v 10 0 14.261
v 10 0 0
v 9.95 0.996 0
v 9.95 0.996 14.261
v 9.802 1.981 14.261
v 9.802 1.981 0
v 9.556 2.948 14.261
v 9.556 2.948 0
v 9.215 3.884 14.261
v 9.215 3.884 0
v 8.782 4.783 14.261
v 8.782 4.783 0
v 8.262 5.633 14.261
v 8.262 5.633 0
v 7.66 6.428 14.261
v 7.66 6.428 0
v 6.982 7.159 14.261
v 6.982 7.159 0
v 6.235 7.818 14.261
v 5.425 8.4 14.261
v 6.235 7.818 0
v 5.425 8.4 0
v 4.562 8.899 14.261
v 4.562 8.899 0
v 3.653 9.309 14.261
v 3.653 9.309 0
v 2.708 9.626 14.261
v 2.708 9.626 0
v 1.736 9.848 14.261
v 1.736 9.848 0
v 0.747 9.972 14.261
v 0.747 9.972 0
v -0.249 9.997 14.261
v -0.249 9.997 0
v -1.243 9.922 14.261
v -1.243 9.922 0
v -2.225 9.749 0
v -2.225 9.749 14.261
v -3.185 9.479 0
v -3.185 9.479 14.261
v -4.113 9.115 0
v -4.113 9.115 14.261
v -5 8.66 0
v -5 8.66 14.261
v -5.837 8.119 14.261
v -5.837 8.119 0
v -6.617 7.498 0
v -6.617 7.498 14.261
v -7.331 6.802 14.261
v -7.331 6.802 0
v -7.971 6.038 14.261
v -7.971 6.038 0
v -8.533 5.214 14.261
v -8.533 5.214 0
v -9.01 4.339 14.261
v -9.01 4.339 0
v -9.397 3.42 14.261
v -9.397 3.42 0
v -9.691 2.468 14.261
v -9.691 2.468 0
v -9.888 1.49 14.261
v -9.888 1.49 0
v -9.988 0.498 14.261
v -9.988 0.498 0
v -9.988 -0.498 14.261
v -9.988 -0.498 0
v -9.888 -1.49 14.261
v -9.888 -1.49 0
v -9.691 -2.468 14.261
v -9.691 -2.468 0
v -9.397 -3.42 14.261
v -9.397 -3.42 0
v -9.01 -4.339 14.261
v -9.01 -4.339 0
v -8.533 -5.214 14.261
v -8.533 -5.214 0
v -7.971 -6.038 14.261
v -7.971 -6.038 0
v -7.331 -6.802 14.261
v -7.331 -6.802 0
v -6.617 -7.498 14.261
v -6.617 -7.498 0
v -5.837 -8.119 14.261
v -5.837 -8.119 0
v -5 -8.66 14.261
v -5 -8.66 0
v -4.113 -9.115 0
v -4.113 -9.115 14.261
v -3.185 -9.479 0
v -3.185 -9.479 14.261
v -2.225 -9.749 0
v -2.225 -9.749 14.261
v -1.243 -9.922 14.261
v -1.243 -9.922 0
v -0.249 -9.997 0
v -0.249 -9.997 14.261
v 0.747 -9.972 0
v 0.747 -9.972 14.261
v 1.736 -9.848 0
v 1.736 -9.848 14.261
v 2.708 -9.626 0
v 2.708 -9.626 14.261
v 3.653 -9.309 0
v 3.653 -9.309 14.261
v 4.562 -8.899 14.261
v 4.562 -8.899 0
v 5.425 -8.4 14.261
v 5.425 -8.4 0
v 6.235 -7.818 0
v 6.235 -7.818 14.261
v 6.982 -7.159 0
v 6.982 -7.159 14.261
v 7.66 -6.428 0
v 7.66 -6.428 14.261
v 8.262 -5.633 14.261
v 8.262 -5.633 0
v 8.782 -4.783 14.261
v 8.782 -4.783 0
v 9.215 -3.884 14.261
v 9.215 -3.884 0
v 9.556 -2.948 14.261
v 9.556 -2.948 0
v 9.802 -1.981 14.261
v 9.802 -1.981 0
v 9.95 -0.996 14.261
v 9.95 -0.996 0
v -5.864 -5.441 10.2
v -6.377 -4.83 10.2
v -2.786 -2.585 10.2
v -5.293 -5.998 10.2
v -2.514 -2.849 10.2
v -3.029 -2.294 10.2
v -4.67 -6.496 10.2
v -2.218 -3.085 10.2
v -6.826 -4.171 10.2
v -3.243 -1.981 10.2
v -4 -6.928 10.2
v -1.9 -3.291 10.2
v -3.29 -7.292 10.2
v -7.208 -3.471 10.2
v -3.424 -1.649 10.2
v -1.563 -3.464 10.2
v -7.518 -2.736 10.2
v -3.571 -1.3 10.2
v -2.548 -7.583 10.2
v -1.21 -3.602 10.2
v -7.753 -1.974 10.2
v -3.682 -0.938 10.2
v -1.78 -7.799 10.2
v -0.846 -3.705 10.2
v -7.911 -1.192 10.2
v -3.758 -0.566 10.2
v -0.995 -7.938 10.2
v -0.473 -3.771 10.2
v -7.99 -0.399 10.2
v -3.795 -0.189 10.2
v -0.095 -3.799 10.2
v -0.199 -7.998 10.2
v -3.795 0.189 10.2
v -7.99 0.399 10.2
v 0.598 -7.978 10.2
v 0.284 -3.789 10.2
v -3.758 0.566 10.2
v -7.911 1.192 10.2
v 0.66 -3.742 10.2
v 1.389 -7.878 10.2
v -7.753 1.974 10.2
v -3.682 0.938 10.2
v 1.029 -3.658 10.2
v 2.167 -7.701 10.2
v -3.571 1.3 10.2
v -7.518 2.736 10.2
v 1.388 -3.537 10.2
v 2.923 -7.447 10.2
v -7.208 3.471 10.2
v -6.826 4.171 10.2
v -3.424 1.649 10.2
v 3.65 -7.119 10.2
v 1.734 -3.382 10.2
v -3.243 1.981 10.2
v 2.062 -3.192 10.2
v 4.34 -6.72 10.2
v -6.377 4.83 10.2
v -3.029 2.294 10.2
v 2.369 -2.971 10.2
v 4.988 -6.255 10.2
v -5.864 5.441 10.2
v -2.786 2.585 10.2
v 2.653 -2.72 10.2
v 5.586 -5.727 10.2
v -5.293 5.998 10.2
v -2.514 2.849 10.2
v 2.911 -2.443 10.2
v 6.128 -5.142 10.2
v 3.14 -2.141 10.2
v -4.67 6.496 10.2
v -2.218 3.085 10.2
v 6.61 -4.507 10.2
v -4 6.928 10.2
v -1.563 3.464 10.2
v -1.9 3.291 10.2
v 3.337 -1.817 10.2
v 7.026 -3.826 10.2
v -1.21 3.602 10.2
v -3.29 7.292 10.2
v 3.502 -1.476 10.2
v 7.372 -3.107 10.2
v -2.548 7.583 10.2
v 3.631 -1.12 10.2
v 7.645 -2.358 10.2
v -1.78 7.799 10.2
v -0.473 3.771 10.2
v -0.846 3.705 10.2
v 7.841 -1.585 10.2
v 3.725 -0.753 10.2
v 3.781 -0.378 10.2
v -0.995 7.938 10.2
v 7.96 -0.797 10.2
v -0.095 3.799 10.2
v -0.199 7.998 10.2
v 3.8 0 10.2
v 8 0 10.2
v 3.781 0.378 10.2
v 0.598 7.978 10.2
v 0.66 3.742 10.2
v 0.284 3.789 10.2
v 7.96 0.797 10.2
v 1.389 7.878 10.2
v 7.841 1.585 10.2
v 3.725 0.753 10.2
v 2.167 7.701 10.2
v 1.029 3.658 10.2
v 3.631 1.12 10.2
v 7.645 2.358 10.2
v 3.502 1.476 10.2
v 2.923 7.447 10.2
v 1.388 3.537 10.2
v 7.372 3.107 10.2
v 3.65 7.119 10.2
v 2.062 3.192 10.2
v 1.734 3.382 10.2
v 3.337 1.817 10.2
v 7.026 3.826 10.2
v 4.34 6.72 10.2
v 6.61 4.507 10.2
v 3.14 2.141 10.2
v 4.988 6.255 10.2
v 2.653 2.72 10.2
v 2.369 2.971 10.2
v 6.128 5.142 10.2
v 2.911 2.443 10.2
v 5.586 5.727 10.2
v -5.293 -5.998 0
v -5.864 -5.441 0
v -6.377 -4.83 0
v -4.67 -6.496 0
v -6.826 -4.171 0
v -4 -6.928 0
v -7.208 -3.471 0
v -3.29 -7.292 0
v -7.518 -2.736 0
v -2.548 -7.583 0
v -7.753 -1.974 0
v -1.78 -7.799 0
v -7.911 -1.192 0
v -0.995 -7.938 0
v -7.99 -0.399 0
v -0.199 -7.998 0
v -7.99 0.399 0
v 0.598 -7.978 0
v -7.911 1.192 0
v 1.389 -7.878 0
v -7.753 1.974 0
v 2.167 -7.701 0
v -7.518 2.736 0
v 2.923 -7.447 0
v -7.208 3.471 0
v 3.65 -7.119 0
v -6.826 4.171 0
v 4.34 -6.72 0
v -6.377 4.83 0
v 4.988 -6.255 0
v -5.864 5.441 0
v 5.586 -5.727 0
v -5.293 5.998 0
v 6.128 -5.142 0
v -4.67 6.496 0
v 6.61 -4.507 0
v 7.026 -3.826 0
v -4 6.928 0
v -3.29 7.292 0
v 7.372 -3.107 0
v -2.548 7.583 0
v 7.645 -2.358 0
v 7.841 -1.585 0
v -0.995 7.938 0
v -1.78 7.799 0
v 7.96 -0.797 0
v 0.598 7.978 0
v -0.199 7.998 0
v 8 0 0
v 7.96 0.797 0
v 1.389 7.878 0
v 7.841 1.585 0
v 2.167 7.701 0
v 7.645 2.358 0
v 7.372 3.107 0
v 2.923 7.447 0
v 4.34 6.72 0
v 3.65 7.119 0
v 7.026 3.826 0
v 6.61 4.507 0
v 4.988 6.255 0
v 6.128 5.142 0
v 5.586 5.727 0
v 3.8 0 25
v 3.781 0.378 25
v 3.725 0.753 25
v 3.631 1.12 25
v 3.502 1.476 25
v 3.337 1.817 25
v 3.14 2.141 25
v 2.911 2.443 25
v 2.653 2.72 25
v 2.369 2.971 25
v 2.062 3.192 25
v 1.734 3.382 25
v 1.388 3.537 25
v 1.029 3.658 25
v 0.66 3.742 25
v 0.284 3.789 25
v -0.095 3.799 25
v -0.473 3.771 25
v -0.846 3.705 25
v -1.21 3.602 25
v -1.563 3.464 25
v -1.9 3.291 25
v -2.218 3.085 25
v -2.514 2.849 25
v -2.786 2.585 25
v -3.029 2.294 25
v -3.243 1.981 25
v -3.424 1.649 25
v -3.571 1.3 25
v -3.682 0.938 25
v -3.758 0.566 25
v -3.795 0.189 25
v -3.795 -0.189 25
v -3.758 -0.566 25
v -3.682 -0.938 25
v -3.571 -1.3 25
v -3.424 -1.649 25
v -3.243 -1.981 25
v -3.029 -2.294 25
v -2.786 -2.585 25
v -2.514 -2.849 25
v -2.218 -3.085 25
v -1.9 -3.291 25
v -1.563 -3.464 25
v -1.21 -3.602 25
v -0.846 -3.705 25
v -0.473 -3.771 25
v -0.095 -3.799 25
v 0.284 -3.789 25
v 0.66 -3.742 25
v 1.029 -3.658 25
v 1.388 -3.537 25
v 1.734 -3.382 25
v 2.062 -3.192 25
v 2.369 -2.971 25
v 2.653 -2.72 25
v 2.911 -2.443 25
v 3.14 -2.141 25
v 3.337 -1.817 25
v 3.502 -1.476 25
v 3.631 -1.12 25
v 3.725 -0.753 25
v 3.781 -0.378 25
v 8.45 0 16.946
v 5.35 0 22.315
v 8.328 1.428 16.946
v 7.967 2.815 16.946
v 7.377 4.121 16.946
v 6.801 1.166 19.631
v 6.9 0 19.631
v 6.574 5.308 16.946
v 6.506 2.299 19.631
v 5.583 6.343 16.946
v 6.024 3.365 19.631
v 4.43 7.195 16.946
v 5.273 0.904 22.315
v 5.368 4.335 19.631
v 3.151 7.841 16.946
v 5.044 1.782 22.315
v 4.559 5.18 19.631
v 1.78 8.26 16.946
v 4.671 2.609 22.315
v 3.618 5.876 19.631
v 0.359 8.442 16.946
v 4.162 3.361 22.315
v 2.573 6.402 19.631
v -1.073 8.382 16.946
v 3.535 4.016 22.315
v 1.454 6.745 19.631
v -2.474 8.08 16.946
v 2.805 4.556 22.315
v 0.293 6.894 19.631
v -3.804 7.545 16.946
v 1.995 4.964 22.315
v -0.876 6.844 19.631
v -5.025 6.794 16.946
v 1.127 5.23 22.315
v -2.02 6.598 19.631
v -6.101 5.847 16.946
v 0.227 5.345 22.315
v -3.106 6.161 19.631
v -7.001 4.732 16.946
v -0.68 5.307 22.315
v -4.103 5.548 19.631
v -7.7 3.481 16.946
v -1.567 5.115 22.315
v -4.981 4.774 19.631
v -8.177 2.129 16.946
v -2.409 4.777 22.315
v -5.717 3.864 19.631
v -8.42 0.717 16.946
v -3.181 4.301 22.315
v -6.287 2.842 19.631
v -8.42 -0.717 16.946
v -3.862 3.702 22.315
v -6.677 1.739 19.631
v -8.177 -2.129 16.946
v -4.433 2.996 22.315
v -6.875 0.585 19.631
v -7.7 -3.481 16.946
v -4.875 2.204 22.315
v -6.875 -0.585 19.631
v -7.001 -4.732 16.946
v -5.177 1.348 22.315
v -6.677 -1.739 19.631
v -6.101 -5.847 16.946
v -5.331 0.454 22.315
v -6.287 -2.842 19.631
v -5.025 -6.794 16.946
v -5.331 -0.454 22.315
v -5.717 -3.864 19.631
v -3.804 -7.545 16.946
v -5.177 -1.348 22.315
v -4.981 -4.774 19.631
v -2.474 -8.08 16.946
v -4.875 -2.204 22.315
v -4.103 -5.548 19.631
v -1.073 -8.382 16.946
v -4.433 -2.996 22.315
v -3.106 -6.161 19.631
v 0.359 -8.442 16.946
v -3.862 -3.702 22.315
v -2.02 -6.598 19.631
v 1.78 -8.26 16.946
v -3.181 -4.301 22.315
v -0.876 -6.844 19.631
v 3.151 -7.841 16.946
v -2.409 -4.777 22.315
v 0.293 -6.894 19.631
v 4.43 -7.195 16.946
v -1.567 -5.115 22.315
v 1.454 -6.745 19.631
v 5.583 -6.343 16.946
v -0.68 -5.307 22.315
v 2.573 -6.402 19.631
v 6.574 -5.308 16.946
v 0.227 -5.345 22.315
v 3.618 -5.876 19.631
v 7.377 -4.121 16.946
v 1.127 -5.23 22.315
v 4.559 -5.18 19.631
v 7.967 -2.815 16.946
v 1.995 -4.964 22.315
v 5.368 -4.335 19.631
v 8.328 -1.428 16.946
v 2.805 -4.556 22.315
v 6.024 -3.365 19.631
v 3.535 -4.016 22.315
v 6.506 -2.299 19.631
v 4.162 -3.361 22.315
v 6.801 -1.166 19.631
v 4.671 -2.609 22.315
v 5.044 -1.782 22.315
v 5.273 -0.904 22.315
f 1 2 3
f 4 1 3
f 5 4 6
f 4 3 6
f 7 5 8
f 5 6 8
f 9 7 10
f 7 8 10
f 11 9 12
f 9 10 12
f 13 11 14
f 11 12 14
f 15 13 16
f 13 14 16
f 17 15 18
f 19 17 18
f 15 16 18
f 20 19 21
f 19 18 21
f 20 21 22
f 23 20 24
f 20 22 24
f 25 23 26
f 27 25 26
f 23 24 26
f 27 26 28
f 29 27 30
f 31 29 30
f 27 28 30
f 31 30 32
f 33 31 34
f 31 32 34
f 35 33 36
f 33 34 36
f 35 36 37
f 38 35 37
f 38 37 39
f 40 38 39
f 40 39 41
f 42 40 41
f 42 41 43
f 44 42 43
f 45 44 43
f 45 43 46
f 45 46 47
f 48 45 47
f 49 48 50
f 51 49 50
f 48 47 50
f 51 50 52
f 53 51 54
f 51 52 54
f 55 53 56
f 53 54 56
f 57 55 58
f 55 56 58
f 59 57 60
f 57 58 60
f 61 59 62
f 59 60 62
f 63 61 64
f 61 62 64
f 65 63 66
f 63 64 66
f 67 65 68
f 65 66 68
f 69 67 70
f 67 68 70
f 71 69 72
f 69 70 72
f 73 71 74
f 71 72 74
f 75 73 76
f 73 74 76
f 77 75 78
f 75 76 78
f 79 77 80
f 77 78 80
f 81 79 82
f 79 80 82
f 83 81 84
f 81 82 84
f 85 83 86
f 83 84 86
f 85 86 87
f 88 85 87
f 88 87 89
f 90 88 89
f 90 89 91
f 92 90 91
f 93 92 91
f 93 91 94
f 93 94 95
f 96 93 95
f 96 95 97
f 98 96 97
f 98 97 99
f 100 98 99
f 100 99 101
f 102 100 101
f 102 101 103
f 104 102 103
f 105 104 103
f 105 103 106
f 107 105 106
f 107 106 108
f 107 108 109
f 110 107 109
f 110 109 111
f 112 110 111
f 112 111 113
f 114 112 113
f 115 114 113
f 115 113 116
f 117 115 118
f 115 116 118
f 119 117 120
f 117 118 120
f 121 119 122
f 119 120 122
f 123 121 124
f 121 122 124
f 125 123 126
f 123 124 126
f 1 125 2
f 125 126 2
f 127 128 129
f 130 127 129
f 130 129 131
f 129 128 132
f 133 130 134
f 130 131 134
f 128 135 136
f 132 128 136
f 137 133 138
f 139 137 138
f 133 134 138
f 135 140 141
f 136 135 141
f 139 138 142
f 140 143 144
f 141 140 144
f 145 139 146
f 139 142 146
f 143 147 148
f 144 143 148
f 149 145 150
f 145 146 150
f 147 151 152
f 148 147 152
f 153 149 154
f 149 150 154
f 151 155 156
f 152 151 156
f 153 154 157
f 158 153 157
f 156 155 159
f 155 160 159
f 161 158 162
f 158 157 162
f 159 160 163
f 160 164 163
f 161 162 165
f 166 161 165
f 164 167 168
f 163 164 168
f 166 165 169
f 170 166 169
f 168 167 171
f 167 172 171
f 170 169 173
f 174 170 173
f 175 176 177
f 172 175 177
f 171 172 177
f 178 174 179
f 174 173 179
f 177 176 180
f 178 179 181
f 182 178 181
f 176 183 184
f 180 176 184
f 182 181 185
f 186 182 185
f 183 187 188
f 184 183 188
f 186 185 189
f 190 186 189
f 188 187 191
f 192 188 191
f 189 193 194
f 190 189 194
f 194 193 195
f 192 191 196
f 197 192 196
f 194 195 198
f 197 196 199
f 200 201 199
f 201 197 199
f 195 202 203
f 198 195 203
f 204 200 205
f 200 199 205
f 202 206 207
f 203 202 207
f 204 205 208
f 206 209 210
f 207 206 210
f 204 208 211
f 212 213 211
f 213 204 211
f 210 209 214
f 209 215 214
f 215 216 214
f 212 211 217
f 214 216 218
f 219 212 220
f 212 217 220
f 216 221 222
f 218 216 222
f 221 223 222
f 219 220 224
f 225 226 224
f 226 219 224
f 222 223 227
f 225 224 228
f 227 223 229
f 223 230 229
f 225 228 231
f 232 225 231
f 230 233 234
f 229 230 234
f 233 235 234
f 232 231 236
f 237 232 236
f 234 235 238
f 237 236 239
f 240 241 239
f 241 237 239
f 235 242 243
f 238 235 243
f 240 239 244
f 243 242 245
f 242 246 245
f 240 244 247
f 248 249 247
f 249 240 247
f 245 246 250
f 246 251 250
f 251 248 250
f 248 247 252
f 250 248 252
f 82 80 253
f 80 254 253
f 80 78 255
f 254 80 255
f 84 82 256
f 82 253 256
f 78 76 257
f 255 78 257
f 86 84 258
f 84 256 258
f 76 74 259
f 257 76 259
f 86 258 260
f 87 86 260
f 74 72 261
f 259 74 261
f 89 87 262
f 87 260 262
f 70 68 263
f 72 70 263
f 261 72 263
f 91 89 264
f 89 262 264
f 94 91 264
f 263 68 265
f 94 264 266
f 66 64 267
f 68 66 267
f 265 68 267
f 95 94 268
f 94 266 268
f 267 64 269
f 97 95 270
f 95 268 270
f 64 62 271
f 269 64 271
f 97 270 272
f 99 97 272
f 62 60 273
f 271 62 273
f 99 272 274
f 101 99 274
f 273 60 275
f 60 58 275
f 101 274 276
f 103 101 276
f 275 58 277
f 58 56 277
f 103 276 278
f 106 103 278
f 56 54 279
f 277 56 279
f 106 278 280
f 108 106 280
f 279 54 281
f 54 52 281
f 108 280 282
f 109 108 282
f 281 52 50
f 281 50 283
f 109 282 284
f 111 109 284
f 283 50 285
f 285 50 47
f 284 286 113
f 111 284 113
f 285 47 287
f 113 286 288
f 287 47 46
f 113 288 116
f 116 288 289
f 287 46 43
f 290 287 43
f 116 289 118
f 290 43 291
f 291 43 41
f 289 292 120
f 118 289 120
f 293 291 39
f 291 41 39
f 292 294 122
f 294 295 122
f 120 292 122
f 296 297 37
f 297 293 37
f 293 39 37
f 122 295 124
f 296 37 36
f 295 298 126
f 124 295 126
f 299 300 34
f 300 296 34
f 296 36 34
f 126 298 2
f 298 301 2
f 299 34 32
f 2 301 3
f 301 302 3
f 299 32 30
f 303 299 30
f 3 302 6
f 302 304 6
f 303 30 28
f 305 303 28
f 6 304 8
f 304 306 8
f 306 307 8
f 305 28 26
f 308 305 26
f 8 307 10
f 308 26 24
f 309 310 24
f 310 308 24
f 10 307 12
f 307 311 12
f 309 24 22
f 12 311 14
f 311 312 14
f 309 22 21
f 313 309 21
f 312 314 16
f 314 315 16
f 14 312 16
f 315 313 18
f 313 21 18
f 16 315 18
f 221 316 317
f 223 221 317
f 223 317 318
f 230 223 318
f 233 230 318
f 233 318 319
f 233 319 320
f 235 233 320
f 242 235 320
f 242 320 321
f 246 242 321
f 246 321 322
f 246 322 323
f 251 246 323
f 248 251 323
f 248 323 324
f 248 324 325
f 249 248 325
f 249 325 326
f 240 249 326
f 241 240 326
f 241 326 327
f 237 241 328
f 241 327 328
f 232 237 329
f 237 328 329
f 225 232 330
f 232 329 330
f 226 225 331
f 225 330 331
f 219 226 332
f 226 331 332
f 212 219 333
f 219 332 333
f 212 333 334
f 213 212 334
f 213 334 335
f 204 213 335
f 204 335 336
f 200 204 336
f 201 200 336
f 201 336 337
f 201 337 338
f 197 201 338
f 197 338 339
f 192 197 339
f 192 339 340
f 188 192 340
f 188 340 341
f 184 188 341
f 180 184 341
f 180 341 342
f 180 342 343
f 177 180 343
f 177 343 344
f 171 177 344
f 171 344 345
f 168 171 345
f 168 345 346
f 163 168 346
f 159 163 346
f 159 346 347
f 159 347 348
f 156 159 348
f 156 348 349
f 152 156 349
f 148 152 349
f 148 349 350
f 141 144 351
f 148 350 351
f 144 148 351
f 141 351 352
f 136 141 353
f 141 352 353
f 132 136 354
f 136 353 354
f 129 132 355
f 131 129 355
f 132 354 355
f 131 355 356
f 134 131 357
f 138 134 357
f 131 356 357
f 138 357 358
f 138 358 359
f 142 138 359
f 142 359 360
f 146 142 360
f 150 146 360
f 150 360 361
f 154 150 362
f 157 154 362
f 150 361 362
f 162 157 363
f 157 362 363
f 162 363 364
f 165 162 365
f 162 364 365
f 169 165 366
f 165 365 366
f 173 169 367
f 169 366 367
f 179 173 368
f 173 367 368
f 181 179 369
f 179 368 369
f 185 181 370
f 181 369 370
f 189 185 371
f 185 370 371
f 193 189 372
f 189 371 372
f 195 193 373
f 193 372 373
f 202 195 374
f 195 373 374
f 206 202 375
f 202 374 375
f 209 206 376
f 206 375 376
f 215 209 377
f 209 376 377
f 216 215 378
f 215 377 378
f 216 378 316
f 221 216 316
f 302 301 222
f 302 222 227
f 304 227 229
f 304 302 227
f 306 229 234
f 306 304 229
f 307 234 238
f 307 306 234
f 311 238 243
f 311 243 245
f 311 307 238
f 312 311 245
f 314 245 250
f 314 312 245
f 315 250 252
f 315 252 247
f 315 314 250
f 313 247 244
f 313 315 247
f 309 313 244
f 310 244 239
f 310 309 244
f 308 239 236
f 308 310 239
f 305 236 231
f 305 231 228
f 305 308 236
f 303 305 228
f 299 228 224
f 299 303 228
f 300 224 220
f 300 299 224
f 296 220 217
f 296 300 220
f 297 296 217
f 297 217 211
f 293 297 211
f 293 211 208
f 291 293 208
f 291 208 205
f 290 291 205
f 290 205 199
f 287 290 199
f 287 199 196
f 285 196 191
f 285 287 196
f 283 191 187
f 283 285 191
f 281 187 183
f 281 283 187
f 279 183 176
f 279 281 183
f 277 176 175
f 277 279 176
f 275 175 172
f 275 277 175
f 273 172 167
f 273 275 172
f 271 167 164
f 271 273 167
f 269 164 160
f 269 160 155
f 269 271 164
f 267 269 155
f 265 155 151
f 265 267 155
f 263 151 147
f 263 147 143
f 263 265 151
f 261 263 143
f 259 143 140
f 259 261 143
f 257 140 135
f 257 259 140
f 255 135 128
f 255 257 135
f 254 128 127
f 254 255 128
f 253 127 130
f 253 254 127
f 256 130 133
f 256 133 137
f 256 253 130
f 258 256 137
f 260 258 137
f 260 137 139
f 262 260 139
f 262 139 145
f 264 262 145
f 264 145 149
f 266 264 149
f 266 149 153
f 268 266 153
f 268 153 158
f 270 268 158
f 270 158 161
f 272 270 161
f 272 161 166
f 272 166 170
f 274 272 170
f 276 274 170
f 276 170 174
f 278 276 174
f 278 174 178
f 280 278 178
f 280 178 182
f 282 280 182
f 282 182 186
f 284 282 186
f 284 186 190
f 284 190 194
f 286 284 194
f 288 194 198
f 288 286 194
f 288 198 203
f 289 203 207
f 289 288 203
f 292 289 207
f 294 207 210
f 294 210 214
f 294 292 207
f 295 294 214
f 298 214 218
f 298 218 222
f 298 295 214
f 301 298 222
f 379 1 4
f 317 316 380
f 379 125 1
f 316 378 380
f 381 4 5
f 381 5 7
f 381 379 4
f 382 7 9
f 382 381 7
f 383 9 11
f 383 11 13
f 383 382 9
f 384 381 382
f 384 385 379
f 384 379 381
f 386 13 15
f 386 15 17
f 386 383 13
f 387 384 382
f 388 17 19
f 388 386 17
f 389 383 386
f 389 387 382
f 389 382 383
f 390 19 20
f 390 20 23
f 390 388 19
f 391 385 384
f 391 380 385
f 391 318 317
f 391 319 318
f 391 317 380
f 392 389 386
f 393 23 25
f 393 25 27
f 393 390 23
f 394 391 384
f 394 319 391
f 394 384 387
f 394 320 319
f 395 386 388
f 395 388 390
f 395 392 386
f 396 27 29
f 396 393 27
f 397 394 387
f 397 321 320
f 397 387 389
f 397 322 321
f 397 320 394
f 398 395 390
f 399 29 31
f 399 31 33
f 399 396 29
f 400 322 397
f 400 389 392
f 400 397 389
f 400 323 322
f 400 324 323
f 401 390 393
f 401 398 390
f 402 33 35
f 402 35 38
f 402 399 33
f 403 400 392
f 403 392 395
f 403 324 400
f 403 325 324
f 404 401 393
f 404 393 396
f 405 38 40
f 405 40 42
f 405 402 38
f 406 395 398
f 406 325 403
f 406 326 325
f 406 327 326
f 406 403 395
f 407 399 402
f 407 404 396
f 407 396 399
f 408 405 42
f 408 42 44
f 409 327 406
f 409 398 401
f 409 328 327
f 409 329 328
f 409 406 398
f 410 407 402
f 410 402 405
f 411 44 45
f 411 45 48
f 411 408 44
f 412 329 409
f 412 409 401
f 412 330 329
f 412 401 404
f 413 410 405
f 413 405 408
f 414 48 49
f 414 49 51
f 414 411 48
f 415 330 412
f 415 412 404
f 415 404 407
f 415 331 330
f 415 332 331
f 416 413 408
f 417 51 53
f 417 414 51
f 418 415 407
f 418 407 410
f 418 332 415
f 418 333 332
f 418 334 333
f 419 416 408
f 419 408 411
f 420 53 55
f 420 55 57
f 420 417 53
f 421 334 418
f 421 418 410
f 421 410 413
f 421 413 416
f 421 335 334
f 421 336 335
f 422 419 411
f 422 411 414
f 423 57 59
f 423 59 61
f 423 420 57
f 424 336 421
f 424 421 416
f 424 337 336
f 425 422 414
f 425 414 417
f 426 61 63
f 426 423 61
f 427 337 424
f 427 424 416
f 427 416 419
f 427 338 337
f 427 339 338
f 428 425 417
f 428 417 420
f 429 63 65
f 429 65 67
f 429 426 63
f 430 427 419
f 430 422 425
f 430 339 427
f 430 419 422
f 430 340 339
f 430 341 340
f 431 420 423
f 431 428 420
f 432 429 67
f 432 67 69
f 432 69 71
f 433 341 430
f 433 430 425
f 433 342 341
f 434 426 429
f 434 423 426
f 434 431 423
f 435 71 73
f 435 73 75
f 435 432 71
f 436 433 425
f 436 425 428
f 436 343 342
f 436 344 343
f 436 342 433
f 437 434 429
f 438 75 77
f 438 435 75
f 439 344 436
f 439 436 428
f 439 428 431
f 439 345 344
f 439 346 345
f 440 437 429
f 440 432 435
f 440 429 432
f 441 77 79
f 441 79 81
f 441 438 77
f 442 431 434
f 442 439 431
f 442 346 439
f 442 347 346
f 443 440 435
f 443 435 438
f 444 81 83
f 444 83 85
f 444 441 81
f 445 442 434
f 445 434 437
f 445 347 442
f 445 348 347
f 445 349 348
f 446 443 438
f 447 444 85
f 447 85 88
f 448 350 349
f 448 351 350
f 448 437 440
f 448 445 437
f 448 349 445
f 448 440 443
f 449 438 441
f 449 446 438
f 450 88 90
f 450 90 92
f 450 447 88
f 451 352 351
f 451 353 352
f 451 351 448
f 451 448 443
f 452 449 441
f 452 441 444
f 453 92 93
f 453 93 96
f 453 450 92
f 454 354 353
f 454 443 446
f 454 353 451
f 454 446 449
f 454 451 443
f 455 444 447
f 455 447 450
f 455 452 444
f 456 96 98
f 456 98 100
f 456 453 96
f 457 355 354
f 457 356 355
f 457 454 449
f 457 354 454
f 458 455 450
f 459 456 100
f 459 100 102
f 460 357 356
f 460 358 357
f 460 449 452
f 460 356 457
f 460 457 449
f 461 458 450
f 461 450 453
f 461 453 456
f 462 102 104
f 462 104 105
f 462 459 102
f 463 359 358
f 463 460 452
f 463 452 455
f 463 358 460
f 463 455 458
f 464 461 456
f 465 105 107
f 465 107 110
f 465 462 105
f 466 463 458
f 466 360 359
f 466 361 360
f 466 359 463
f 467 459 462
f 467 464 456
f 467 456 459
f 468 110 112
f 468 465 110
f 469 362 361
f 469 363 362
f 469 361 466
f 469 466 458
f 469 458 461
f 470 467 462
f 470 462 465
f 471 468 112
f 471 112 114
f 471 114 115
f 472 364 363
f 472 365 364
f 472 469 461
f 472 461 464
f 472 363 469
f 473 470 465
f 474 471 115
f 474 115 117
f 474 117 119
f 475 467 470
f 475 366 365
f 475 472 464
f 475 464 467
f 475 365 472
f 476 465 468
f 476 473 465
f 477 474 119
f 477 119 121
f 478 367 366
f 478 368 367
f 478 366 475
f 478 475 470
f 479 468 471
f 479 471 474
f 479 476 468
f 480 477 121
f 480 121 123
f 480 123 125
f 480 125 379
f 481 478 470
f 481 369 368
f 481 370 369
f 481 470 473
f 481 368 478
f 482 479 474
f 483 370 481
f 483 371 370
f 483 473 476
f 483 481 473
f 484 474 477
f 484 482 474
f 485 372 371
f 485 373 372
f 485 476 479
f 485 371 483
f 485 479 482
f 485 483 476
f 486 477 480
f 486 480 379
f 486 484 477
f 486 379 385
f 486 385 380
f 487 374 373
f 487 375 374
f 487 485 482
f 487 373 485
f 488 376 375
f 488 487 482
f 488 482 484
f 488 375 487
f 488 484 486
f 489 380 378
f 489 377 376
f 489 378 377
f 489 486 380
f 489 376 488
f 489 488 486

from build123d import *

# Parameters (mm, degrees)
F0_R     = 10
F1_DEPTH = 25
F2_SIZE2 = 6.2
F2_SIZE  = 10.7387150069
F3_R     = 3.8
F4_DEPTH = 40.7
F5_R     = 8
F6_DEPTH = 10.2


with BuildPart() as f1:
    # F0 (on Top) → F1 (new body)
    with BuildSketch(Plane.XY):
        Circle(F0_R)
    extrude(amount=F1_DEPTH)

    # F2
    f2_edges = [f1.edges().sort_by_distance(p)[0] for p in [
        (-10, 0, 25),
    ]]
    f2_side = f1.faces().sort_by_distance((-10, 0, 12.5))[0]
    chamfer(f2_edges, length=F2_SIZE, length2=F2_SIZE2, reference=f2_side)

    # F3 (on face) → F4 (cut)
    with BuildSketch(Plane.XY.offset(25)):
        Circle(F3_R)
    extrude(amount=-F4_DEPTH, mode=Mode.SUBTRACT)

    # F5 (on Top) → F6 (cut)
    with BuildSketch(Plane.XY):
        Circle(F5_R)
    extrude(amount=F6_DEPTH, mode=Mode.SUBTRACT)


solid = f1.part
